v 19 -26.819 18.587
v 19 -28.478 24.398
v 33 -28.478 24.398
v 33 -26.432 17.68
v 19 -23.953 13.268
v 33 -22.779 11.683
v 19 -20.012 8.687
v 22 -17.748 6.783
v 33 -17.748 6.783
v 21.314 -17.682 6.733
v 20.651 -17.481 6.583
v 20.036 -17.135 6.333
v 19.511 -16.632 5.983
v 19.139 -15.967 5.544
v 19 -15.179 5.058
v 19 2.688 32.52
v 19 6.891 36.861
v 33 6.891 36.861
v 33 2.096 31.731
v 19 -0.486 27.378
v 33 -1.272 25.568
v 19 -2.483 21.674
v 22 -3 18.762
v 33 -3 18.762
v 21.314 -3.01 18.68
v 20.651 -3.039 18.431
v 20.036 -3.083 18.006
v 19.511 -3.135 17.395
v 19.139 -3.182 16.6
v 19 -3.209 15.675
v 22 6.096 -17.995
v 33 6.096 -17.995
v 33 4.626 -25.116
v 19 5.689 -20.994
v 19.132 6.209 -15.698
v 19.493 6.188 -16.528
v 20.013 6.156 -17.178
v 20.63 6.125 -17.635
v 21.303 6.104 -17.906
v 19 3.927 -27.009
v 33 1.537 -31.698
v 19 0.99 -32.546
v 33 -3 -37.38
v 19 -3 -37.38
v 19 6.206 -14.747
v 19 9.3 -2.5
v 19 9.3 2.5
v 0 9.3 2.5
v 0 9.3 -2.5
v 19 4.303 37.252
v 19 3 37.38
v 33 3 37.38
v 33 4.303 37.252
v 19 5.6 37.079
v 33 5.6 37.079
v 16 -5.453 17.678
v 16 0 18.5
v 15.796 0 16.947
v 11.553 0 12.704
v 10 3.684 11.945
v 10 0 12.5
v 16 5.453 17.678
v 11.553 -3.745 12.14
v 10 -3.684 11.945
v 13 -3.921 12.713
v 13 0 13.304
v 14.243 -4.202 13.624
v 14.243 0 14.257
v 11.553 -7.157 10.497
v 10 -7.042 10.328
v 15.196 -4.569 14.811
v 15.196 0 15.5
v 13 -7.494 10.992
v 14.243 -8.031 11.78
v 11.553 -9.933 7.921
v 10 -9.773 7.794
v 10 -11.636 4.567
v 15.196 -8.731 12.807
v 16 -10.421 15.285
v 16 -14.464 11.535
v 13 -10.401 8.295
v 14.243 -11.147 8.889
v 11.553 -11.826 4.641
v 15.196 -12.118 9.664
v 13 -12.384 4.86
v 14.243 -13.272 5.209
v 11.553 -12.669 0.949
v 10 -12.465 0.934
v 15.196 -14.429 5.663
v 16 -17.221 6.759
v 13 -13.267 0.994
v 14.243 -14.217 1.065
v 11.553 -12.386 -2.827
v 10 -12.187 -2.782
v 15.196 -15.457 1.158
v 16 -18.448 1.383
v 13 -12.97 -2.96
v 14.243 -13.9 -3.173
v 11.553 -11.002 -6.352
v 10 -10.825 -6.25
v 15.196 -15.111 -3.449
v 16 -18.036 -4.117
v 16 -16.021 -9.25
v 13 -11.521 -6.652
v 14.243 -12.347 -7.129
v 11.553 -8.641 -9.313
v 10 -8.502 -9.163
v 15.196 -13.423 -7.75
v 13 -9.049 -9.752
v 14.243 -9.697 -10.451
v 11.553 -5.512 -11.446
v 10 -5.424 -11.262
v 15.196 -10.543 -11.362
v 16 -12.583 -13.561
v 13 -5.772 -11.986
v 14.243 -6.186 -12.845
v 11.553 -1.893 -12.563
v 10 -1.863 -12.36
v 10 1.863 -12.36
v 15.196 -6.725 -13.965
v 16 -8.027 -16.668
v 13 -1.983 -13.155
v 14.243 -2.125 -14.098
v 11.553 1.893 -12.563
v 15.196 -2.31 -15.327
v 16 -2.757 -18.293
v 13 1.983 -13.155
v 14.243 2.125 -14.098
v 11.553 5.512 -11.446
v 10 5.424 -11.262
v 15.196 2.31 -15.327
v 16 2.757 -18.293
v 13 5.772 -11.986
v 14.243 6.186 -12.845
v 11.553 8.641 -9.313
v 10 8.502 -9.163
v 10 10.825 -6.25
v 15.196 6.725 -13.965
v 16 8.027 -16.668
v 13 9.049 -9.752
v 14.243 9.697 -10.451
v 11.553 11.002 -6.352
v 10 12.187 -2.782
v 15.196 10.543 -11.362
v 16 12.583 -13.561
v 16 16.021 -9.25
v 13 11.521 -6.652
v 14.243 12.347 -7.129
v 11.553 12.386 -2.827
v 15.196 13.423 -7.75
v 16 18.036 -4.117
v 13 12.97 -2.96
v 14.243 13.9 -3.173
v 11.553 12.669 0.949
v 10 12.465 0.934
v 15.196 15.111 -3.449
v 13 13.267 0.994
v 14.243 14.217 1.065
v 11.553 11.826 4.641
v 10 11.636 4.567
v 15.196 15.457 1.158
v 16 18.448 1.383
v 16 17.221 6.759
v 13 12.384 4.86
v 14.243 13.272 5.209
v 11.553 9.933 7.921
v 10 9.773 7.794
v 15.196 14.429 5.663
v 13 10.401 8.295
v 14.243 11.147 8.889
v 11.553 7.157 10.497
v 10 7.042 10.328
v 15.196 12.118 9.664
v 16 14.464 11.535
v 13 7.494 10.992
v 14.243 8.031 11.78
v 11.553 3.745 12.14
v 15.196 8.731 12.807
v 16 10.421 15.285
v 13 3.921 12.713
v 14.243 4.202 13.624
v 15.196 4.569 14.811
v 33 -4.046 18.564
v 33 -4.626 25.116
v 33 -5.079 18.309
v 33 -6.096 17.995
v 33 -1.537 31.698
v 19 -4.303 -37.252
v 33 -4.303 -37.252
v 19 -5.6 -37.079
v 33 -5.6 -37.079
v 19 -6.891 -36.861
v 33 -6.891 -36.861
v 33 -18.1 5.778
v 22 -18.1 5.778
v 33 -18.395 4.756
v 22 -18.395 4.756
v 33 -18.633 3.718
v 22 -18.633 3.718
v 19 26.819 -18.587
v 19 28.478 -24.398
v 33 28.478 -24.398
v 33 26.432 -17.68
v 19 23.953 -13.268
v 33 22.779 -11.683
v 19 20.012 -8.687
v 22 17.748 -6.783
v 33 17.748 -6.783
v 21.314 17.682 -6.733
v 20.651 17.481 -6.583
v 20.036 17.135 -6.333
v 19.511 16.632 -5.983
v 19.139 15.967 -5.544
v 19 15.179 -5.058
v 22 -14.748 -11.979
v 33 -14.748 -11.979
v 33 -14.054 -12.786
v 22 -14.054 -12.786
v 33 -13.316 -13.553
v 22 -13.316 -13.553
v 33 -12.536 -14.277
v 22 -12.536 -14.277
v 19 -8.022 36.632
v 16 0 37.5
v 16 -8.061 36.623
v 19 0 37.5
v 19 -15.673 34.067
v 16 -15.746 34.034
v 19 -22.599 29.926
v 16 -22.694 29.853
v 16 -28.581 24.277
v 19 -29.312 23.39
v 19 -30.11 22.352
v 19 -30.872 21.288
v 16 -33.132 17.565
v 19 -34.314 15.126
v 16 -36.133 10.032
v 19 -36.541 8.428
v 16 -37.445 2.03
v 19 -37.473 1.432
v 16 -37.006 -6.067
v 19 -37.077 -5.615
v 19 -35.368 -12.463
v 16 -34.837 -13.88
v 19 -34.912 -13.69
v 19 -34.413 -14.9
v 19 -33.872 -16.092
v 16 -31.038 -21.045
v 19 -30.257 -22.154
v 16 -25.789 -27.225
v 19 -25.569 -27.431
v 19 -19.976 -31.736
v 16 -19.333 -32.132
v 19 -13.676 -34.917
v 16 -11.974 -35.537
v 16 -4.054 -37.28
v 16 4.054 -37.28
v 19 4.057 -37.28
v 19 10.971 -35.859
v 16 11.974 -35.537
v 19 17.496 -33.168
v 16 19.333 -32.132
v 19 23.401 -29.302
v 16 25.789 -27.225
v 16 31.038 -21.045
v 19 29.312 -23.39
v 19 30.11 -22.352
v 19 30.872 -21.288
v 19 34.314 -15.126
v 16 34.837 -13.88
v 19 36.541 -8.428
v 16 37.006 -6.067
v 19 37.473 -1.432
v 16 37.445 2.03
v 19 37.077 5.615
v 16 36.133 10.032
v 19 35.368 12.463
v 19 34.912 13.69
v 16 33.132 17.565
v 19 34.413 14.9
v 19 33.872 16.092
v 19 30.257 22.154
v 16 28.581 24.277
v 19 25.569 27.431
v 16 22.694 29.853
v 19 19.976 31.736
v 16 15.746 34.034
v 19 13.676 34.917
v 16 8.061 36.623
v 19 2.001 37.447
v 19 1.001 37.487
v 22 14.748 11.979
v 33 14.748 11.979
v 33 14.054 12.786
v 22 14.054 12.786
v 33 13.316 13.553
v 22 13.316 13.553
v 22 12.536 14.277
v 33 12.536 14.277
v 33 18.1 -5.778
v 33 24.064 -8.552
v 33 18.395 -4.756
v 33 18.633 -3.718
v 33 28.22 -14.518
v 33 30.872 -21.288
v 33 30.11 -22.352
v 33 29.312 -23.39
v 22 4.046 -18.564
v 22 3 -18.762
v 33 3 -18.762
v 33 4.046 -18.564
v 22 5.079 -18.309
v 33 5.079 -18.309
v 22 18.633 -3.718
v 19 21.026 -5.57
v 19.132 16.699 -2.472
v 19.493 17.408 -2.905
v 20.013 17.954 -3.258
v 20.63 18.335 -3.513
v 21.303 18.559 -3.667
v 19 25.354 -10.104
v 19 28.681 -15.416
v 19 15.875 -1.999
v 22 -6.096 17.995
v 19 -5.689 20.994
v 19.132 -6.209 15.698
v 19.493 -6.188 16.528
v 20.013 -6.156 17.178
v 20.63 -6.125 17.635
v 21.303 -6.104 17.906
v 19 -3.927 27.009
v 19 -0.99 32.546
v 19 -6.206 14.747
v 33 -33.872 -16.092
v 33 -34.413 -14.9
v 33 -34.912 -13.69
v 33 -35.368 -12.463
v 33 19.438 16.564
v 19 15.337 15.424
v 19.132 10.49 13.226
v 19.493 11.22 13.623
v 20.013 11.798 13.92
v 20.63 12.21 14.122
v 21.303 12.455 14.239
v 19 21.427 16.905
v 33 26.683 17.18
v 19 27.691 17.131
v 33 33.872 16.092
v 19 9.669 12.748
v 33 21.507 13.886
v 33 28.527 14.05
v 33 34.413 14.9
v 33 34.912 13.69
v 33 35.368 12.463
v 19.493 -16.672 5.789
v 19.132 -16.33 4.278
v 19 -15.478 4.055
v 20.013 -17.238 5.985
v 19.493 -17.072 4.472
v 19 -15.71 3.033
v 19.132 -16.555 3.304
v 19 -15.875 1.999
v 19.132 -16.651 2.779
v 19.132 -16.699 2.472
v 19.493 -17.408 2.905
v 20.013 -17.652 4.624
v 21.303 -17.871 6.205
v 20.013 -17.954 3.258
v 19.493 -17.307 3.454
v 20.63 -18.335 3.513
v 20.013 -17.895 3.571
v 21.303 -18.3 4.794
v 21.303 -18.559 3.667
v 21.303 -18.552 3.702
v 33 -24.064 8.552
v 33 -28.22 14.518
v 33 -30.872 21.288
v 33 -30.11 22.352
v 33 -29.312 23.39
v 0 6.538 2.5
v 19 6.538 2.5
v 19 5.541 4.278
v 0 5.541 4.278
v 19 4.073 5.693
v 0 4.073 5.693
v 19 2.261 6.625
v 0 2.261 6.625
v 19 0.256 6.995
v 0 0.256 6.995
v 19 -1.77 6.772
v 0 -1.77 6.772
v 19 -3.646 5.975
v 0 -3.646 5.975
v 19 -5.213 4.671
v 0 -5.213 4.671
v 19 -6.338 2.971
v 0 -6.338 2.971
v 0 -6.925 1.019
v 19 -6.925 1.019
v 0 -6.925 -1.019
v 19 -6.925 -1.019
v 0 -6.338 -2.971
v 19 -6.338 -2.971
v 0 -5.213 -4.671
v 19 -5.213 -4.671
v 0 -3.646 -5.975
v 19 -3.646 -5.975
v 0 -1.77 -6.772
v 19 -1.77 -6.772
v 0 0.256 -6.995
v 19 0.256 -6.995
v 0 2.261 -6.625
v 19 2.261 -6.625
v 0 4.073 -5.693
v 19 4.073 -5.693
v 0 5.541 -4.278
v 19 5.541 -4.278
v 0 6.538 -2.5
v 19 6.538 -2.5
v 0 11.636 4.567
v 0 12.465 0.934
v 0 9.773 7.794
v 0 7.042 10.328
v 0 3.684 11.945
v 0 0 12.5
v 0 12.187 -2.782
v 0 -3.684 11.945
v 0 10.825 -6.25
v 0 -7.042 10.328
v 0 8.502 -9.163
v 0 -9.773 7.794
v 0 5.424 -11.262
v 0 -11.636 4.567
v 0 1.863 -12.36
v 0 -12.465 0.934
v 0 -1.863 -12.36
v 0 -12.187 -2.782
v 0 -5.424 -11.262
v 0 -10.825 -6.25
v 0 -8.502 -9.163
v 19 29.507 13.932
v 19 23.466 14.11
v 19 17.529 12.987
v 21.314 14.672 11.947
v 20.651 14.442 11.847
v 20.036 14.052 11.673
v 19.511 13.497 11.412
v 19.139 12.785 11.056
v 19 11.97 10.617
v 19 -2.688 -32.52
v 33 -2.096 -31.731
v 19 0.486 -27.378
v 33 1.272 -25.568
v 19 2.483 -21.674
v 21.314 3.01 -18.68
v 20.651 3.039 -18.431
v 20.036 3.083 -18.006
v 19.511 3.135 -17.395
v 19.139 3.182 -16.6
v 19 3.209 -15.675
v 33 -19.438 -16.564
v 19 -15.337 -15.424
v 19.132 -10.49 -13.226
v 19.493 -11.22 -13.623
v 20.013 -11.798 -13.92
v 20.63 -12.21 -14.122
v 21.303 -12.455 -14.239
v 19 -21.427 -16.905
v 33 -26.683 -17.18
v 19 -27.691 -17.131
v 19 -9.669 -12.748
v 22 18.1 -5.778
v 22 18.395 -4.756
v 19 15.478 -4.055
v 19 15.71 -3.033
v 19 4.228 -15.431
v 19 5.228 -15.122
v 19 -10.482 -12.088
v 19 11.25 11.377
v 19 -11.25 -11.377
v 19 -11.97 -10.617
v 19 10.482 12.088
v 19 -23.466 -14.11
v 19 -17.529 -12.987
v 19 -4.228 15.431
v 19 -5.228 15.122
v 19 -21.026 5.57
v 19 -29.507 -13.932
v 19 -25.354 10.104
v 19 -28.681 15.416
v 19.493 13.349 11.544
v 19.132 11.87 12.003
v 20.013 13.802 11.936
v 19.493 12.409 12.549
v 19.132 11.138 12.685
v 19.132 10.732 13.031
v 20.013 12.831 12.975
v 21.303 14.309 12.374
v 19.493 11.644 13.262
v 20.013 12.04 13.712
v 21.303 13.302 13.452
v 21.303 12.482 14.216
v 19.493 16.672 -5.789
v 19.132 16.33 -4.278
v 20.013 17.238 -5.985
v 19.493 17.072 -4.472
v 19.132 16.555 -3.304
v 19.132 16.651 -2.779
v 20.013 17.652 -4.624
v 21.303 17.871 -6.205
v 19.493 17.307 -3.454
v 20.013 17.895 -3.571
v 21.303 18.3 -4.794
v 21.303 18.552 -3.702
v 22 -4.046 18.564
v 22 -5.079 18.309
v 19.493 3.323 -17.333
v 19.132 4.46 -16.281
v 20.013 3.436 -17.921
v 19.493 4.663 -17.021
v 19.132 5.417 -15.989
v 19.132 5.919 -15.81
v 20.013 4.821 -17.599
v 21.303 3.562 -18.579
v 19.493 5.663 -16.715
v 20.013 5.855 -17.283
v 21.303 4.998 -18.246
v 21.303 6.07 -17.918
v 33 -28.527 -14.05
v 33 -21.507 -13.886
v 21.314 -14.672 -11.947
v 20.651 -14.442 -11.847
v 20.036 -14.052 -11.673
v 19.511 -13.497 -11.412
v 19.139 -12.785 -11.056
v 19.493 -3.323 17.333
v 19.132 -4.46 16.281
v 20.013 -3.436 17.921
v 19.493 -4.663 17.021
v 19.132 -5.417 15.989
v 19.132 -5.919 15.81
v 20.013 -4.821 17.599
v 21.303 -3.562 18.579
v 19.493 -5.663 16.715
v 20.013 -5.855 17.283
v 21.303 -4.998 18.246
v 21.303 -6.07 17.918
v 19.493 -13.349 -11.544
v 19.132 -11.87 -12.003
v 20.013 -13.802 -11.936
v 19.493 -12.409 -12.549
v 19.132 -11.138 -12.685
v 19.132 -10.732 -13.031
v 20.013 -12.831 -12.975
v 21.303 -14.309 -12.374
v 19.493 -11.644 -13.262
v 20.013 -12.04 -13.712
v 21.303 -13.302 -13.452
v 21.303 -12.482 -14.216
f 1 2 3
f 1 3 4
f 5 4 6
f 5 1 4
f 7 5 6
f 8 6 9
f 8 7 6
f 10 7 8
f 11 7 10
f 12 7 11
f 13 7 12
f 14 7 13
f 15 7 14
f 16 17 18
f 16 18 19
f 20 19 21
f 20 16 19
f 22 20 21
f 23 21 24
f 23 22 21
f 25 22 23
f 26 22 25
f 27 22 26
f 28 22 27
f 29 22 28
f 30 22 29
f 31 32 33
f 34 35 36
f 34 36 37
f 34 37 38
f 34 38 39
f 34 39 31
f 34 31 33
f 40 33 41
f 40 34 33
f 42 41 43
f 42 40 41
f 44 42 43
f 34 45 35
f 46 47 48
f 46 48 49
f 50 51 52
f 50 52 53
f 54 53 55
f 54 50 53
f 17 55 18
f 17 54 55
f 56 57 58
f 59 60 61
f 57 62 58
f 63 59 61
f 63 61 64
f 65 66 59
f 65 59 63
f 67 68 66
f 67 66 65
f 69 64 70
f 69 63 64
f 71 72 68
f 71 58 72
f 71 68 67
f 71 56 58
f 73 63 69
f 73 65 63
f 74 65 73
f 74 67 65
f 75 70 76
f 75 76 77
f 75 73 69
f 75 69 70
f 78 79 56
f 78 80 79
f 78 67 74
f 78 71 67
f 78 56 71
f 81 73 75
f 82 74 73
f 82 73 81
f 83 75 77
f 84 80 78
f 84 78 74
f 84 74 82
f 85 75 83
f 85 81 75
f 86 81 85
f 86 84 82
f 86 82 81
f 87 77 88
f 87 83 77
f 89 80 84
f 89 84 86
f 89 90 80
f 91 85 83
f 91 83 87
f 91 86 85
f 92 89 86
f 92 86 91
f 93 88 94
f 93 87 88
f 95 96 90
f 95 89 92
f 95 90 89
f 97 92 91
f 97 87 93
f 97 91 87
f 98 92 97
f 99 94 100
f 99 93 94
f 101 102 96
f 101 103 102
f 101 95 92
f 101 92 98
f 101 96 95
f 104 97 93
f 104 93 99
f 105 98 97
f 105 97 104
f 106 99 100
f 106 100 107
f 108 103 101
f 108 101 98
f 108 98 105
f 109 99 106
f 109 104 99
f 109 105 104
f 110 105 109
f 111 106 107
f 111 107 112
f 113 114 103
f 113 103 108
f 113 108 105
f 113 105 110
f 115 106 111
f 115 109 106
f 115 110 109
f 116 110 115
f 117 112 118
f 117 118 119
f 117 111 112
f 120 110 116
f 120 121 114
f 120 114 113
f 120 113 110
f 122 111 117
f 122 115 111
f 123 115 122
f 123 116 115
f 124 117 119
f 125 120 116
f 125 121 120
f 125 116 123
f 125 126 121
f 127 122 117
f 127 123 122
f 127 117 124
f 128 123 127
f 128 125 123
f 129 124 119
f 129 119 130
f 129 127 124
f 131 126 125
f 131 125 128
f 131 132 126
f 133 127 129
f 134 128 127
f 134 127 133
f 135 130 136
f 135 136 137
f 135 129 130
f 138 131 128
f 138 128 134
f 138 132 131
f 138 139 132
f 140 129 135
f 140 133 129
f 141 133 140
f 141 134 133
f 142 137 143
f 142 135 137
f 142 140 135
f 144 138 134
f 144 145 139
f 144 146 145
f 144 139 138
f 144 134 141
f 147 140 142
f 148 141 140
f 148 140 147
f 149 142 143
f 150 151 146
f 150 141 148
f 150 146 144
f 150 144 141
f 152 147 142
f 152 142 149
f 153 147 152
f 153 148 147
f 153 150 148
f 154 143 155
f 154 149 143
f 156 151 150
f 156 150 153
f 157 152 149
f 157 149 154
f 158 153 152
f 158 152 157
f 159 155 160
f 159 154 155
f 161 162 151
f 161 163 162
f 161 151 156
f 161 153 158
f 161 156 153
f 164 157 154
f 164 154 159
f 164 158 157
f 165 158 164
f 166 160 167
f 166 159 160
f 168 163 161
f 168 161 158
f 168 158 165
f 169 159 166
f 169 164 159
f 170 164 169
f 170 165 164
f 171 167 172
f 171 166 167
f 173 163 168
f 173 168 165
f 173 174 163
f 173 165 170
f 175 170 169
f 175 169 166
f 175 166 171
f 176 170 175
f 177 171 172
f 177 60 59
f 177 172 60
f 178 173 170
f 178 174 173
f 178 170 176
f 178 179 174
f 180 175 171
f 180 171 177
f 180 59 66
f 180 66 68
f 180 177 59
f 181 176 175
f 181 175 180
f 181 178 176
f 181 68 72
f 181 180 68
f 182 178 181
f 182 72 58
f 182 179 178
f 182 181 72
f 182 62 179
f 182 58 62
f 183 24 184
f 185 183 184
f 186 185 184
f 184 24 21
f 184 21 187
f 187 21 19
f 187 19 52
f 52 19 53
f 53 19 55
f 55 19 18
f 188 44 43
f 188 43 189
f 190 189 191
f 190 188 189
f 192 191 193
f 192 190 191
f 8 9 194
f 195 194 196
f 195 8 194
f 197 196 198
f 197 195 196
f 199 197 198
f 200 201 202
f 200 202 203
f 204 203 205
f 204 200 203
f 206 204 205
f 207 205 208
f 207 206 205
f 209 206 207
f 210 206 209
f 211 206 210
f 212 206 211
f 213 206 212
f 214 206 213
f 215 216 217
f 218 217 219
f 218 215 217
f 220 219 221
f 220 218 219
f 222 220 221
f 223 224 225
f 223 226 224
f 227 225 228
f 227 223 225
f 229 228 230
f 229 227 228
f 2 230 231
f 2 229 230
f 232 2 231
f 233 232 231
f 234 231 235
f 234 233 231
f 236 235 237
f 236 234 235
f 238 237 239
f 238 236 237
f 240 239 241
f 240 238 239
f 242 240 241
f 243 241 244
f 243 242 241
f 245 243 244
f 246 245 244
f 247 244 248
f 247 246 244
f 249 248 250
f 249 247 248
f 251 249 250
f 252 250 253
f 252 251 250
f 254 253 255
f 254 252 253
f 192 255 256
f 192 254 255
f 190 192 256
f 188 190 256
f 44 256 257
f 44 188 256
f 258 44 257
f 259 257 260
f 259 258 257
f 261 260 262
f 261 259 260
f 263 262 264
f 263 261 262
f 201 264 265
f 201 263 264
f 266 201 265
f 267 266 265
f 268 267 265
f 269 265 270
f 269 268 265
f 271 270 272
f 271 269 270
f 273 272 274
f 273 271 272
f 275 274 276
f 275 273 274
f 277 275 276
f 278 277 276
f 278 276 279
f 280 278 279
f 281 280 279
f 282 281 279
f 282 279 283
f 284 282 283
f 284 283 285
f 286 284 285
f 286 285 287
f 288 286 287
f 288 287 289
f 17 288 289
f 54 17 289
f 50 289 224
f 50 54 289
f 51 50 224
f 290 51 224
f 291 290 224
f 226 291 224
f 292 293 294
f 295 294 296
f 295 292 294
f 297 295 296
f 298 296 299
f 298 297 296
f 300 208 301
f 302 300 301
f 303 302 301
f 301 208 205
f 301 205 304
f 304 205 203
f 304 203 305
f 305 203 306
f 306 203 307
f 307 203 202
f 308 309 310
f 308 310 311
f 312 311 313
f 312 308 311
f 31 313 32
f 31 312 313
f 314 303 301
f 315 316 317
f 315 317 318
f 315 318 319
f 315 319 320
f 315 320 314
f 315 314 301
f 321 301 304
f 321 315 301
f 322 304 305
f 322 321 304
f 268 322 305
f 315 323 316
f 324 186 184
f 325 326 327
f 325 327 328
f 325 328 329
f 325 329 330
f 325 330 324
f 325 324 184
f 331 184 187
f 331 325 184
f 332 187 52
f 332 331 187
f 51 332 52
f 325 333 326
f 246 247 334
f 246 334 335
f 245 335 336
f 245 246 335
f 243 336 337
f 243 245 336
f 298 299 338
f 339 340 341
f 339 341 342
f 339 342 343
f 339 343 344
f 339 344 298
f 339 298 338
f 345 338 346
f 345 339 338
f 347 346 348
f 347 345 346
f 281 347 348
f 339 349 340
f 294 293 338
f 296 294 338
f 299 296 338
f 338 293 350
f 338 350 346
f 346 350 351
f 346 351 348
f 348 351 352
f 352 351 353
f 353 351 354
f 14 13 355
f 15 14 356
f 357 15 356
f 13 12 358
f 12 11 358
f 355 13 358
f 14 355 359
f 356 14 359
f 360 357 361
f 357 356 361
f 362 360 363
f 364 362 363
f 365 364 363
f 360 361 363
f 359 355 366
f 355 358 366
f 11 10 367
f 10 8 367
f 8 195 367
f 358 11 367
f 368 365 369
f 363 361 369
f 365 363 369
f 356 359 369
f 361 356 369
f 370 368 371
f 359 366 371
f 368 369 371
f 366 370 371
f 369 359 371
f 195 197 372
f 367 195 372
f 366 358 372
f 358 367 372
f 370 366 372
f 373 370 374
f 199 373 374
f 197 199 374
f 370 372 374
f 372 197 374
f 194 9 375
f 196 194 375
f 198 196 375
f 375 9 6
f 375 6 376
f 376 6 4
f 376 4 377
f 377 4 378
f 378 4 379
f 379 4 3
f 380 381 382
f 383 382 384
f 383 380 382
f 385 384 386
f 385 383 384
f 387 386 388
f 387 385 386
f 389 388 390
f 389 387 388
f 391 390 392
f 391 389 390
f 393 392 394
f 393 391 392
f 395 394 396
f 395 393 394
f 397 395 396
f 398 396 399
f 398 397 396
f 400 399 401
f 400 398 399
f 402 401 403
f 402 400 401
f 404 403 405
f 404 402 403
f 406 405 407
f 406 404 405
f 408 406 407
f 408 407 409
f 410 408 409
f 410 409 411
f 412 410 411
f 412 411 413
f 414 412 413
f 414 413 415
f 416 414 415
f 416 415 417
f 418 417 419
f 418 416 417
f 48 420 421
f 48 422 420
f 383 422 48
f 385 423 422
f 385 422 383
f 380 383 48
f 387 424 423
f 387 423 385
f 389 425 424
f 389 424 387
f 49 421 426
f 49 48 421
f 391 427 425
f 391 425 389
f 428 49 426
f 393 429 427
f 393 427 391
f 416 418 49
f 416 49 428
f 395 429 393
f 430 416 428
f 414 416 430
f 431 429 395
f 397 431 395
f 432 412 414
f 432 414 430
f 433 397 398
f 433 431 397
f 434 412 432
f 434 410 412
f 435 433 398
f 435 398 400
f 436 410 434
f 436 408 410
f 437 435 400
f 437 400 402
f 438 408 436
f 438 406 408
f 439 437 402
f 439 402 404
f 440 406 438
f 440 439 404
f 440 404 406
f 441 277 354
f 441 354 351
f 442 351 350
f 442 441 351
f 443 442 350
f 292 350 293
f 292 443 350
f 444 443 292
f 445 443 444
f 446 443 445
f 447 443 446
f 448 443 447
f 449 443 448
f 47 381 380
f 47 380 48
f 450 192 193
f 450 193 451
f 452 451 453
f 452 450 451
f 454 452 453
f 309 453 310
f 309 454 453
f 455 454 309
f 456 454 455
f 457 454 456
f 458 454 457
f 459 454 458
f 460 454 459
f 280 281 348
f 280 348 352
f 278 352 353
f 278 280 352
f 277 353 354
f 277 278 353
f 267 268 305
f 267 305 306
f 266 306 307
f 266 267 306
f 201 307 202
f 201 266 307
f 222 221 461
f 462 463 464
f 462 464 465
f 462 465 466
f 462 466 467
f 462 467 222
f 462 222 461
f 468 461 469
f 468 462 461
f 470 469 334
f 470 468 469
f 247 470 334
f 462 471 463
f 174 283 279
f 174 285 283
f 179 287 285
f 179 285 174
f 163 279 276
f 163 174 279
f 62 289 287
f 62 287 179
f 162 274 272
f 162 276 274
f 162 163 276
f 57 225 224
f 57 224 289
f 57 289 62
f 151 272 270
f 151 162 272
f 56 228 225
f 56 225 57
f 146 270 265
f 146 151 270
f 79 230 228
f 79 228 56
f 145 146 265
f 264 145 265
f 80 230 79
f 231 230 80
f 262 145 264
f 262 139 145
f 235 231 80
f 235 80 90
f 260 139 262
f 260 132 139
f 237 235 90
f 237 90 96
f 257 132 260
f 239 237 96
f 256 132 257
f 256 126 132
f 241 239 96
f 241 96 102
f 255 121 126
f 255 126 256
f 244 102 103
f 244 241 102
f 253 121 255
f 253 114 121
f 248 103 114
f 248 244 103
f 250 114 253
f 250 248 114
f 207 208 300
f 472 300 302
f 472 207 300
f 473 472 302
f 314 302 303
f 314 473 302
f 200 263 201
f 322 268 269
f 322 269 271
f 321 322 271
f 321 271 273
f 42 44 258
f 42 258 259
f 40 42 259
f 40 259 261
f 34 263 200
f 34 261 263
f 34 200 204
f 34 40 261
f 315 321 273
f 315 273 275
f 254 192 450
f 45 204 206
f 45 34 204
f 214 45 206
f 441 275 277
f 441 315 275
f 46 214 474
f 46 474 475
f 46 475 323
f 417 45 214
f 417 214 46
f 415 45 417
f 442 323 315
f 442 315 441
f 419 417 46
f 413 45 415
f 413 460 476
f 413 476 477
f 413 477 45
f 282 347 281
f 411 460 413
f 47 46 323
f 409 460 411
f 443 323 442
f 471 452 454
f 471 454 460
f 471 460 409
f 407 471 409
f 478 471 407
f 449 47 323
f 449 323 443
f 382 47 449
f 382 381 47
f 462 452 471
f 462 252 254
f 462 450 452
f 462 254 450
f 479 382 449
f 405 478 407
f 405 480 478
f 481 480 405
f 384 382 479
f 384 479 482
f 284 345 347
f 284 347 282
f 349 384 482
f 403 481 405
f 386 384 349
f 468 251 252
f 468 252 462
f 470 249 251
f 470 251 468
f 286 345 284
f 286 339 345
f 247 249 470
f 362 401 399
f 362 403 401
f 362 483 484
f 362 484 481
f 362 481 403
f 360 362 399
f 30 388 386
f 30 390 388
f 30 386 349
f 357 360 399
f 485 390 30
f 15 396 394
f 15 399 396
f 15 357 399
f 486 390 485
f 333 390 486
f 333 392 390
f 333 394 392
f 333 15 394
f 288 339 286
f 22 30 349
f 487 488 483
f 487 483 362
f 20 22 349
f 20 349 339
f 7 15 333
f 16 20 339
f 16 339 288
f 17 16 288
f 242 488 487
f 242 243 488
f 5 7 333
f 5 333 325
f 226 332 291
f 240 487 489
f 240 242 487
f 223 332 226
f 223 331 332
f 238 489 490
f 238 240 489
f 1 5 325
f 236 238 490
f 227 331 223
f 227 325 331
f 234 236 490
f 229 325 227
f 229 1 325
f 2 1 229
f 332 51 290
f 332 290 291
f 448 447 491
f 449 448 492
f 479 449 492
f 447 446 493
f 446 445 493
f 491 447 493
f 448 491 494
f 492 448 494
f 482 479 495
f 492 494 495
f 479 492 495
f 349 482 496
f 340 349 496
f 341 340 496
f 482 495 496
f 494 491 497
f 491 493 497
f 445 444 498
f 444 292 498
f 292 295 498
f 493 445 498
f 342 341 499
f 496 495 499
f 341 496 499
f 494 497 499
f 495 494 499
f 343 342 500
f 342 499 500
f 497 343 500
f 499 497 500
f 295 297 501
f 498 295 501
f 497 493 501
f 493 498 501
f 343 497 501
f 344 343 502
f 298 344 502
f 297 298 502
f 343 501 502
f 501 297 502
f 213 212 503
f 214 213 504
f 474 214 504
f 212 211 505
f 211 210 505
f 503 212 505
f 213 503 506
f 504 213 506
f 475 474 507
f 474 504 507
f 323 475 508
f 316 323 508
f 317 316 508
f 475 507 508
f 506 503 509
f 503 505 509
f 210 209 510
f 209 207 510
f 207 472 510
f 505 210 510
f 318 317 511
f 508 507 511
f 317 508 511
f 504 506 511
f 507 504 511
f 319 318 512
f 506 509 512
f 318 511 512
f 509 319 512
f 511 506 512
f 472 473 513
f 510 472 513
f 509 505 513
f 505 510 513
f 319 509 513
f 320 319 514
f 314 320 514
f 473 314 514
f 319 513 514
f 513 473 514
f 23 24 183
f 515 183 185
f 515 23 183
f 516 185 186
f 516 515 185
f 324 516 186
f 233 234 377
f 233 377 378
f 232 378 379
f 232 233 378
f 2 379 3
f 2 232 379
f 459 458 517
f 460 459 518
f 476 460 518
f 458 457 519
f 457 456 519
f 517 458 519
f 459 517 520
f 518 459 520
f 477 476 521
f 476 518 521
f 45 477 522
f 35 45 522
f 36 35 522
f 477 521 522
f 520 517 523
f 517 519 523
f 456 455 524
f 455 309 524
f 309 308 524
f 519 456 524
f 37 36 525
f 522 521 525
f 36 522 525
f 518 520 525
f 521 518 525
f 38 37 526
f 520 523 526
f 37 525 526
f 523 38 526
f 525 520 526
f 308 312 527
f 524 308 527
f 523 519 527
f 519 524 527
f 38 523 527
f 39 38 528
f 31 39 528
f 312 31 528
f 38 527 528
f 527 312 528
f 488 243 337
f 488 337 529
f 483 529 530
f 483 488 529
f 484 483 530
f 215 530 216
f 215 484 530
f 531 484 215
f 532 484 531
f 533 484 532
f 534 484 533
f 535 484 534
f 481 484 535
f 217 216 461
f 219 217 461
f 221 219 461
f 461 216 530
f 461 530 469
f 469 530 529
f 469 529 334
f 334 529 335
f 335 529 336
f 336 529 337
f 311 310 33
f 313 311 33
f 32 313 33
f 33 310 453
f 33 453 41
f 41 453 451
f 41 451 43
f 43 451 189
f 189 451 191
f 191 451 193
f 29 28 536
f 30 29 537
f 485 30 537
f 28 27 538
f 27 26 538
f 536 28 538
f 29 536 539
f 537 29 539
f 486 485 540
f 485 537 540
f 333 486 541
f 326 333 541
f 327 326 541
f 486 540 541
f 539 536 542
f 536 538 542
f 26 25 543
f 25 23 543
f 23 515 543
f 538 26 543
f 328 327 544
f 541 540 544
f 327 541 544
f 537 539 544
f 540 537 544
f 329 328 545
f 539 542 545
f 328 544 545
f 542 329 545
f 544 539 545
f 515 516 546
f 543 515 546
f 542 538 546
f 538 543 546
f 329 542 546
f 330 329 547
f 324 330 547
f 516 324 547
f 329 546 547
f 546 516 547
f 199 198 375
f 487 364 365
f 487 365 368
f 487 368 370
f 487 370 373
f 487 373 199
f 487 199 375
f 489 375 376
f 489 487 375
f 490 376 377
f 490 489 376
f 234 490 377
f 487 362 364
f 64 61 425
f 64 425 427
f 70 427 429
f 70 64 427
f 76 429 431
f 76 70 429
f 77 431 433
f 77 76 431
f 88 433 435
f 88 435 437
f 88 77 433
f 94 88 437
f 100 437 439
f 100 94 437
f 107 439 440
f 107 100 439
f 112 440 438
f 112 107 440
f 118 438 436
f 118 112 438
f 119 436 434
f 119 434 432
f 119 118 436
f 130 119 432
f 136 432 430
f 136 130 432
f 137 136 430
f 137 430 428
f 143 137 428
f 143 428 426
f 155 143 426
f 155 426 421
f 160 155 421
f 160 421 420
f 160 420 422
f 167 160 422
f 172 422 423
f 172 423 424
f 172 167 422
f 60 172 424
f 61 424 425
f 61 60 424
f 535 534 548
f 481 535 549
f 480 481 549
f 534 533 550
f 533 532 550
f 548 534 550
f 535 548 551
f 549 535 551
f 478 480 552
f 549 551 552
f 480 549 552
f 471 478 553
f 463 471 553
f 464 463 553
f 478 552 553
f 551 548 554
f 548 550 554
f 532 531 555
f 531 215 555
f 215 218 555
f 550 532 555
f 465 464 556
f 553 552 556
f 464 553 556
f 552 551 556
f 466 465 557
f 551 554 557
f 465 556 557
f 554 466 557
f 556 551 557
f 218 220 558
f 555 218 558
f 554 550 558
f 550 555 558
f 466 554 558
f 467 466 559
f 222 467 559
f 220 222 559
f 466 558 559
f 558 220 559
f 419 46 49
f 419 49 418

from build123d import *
from build123d.topology import SkipClean

# Parameters (mm, degrees)
FILLET1_R                = 6
CUT_EXTRUDE1_DEPTH       = 20
BOSS_EXTRUDE1_DEPTH      = 14
FILLET2_R                = 3
CIRPATTERN1_COUNT        = 6
FILLET2_OF_CIRPATTERN1_R = 3


with BuildPart() as part:
    # Sketch1 → Revolve1 (revolve)
    with BuildSketch(Plane.XY, mode=Mode.PRIVATE) as revolve1_sk:
        Polygon((0, 7), (0, 12.5), (16, 12.5), (16, 37.5), (19, 37.5), (19, 7), align=None)
    revolve(revolve1_sk.sketch.rotate(Axis((-91.900691054, 0, 0), (1, 0, 0)), 90), axis=Axis((-91.900691054, 0, 0), (1, 0, 0)))  # turned: the seam where the file's is

    # Fillet1
    fillet1_edges = [part.edges().sort_by_distance(p)[0] for p in [
        (16, 0, -12.5),
    ]]
    fillet(fillet1_edges, radius=FILLET1_R)

    # Sketch2 → Cut-Extrude1 (cut, through all)
    with BuildSketch(Plane(origin=(19, 0, 0), x_dir=(0, 0, -1), z_dir=(1, 0, 0))):
        with BuildLine():
            Line((-2.5, 6.538348415), (-2.5, 9.3))
            Line((-2.5, 9.3), (2.5, 9.3))
            Line((2.5, 9.3), (2.5, 6.538348415))
            ThreePointArc((2.5, 6.538348415), (0, -7), (-2.5, 6.538348415))
        make_face()
    extrude(amount=-CUT_EXTRUDE1_DEPTH, mode=Mode.SUBTRACT)

    # Sketch3 → Boss-Extrude1 (add)
    with BuildSketch(Plane(origin=(19, 0, 0), x_dir=(0, 0, -1), z_dir=(1, 0, 0))):
        with BuildLine():
            ThreePointArc((-36.861475704, 6.890690018), (-28.755483578, 0.217996332), (-18.761663039, -3))
            ThreePointArc((-18.761663039, -3), (-18.443627284, -4.564275696), (-17.995407864, -6.09633462))
            ThreePointArc((-17.995407864, -6.09633462), (-28.49792429, -3.274961963), (-37.379807383, 3))
            ThreePointArc((-37.379807383, 3), (-37.171580486, 4.952131277), (-36.861475704, 6.890690018))
        make_face()
    boss_extrude1 = extrude(amount=BOSS_EXTRUDE1_DEPTH)

    # Fillet2
    fillet2_edges = [part.edges().sort_by_distance(p)[0] for p in [
        (19, -4.564275696, 18.443627284),
    ]]
    fillet(fillet2_edges, radius=FILLET2_R)

    # CirPattern1: Boss-Extrude1 ×6 about axis
    with SkipClean():  # keep this step's faces unmerged: merging them makes the solid invalid here
        cirpattern1_axis = Axis((0, 0, 0), (1, 0, 0))
        for i in range(1, CIRPATTERN1_COUNT):
            add(boss_extrude1.rotate(cirpattern1_axis, i * 360 / CIRPATTERN1_COUNT))

    # Fillet2 of CirPattern1
    fillet2_of_cirpattern1_edges = [part.edges().sort_by_distance(p)[0] for p in [
        (19, -18.254787613, 5.269034939),
        (19, -13.690511918, -13.174592344),
        (19, 4.564275696, -18.443627284),
        (19, 18.254787613, -5.269034939),
        (19, 13.690511918, 13.174592344),
    ]]
    fillet(fillet2_of_cirpattern1_edges, radius=FILLET2_OF_CIRPATTERN1_R)


solid = part.part
